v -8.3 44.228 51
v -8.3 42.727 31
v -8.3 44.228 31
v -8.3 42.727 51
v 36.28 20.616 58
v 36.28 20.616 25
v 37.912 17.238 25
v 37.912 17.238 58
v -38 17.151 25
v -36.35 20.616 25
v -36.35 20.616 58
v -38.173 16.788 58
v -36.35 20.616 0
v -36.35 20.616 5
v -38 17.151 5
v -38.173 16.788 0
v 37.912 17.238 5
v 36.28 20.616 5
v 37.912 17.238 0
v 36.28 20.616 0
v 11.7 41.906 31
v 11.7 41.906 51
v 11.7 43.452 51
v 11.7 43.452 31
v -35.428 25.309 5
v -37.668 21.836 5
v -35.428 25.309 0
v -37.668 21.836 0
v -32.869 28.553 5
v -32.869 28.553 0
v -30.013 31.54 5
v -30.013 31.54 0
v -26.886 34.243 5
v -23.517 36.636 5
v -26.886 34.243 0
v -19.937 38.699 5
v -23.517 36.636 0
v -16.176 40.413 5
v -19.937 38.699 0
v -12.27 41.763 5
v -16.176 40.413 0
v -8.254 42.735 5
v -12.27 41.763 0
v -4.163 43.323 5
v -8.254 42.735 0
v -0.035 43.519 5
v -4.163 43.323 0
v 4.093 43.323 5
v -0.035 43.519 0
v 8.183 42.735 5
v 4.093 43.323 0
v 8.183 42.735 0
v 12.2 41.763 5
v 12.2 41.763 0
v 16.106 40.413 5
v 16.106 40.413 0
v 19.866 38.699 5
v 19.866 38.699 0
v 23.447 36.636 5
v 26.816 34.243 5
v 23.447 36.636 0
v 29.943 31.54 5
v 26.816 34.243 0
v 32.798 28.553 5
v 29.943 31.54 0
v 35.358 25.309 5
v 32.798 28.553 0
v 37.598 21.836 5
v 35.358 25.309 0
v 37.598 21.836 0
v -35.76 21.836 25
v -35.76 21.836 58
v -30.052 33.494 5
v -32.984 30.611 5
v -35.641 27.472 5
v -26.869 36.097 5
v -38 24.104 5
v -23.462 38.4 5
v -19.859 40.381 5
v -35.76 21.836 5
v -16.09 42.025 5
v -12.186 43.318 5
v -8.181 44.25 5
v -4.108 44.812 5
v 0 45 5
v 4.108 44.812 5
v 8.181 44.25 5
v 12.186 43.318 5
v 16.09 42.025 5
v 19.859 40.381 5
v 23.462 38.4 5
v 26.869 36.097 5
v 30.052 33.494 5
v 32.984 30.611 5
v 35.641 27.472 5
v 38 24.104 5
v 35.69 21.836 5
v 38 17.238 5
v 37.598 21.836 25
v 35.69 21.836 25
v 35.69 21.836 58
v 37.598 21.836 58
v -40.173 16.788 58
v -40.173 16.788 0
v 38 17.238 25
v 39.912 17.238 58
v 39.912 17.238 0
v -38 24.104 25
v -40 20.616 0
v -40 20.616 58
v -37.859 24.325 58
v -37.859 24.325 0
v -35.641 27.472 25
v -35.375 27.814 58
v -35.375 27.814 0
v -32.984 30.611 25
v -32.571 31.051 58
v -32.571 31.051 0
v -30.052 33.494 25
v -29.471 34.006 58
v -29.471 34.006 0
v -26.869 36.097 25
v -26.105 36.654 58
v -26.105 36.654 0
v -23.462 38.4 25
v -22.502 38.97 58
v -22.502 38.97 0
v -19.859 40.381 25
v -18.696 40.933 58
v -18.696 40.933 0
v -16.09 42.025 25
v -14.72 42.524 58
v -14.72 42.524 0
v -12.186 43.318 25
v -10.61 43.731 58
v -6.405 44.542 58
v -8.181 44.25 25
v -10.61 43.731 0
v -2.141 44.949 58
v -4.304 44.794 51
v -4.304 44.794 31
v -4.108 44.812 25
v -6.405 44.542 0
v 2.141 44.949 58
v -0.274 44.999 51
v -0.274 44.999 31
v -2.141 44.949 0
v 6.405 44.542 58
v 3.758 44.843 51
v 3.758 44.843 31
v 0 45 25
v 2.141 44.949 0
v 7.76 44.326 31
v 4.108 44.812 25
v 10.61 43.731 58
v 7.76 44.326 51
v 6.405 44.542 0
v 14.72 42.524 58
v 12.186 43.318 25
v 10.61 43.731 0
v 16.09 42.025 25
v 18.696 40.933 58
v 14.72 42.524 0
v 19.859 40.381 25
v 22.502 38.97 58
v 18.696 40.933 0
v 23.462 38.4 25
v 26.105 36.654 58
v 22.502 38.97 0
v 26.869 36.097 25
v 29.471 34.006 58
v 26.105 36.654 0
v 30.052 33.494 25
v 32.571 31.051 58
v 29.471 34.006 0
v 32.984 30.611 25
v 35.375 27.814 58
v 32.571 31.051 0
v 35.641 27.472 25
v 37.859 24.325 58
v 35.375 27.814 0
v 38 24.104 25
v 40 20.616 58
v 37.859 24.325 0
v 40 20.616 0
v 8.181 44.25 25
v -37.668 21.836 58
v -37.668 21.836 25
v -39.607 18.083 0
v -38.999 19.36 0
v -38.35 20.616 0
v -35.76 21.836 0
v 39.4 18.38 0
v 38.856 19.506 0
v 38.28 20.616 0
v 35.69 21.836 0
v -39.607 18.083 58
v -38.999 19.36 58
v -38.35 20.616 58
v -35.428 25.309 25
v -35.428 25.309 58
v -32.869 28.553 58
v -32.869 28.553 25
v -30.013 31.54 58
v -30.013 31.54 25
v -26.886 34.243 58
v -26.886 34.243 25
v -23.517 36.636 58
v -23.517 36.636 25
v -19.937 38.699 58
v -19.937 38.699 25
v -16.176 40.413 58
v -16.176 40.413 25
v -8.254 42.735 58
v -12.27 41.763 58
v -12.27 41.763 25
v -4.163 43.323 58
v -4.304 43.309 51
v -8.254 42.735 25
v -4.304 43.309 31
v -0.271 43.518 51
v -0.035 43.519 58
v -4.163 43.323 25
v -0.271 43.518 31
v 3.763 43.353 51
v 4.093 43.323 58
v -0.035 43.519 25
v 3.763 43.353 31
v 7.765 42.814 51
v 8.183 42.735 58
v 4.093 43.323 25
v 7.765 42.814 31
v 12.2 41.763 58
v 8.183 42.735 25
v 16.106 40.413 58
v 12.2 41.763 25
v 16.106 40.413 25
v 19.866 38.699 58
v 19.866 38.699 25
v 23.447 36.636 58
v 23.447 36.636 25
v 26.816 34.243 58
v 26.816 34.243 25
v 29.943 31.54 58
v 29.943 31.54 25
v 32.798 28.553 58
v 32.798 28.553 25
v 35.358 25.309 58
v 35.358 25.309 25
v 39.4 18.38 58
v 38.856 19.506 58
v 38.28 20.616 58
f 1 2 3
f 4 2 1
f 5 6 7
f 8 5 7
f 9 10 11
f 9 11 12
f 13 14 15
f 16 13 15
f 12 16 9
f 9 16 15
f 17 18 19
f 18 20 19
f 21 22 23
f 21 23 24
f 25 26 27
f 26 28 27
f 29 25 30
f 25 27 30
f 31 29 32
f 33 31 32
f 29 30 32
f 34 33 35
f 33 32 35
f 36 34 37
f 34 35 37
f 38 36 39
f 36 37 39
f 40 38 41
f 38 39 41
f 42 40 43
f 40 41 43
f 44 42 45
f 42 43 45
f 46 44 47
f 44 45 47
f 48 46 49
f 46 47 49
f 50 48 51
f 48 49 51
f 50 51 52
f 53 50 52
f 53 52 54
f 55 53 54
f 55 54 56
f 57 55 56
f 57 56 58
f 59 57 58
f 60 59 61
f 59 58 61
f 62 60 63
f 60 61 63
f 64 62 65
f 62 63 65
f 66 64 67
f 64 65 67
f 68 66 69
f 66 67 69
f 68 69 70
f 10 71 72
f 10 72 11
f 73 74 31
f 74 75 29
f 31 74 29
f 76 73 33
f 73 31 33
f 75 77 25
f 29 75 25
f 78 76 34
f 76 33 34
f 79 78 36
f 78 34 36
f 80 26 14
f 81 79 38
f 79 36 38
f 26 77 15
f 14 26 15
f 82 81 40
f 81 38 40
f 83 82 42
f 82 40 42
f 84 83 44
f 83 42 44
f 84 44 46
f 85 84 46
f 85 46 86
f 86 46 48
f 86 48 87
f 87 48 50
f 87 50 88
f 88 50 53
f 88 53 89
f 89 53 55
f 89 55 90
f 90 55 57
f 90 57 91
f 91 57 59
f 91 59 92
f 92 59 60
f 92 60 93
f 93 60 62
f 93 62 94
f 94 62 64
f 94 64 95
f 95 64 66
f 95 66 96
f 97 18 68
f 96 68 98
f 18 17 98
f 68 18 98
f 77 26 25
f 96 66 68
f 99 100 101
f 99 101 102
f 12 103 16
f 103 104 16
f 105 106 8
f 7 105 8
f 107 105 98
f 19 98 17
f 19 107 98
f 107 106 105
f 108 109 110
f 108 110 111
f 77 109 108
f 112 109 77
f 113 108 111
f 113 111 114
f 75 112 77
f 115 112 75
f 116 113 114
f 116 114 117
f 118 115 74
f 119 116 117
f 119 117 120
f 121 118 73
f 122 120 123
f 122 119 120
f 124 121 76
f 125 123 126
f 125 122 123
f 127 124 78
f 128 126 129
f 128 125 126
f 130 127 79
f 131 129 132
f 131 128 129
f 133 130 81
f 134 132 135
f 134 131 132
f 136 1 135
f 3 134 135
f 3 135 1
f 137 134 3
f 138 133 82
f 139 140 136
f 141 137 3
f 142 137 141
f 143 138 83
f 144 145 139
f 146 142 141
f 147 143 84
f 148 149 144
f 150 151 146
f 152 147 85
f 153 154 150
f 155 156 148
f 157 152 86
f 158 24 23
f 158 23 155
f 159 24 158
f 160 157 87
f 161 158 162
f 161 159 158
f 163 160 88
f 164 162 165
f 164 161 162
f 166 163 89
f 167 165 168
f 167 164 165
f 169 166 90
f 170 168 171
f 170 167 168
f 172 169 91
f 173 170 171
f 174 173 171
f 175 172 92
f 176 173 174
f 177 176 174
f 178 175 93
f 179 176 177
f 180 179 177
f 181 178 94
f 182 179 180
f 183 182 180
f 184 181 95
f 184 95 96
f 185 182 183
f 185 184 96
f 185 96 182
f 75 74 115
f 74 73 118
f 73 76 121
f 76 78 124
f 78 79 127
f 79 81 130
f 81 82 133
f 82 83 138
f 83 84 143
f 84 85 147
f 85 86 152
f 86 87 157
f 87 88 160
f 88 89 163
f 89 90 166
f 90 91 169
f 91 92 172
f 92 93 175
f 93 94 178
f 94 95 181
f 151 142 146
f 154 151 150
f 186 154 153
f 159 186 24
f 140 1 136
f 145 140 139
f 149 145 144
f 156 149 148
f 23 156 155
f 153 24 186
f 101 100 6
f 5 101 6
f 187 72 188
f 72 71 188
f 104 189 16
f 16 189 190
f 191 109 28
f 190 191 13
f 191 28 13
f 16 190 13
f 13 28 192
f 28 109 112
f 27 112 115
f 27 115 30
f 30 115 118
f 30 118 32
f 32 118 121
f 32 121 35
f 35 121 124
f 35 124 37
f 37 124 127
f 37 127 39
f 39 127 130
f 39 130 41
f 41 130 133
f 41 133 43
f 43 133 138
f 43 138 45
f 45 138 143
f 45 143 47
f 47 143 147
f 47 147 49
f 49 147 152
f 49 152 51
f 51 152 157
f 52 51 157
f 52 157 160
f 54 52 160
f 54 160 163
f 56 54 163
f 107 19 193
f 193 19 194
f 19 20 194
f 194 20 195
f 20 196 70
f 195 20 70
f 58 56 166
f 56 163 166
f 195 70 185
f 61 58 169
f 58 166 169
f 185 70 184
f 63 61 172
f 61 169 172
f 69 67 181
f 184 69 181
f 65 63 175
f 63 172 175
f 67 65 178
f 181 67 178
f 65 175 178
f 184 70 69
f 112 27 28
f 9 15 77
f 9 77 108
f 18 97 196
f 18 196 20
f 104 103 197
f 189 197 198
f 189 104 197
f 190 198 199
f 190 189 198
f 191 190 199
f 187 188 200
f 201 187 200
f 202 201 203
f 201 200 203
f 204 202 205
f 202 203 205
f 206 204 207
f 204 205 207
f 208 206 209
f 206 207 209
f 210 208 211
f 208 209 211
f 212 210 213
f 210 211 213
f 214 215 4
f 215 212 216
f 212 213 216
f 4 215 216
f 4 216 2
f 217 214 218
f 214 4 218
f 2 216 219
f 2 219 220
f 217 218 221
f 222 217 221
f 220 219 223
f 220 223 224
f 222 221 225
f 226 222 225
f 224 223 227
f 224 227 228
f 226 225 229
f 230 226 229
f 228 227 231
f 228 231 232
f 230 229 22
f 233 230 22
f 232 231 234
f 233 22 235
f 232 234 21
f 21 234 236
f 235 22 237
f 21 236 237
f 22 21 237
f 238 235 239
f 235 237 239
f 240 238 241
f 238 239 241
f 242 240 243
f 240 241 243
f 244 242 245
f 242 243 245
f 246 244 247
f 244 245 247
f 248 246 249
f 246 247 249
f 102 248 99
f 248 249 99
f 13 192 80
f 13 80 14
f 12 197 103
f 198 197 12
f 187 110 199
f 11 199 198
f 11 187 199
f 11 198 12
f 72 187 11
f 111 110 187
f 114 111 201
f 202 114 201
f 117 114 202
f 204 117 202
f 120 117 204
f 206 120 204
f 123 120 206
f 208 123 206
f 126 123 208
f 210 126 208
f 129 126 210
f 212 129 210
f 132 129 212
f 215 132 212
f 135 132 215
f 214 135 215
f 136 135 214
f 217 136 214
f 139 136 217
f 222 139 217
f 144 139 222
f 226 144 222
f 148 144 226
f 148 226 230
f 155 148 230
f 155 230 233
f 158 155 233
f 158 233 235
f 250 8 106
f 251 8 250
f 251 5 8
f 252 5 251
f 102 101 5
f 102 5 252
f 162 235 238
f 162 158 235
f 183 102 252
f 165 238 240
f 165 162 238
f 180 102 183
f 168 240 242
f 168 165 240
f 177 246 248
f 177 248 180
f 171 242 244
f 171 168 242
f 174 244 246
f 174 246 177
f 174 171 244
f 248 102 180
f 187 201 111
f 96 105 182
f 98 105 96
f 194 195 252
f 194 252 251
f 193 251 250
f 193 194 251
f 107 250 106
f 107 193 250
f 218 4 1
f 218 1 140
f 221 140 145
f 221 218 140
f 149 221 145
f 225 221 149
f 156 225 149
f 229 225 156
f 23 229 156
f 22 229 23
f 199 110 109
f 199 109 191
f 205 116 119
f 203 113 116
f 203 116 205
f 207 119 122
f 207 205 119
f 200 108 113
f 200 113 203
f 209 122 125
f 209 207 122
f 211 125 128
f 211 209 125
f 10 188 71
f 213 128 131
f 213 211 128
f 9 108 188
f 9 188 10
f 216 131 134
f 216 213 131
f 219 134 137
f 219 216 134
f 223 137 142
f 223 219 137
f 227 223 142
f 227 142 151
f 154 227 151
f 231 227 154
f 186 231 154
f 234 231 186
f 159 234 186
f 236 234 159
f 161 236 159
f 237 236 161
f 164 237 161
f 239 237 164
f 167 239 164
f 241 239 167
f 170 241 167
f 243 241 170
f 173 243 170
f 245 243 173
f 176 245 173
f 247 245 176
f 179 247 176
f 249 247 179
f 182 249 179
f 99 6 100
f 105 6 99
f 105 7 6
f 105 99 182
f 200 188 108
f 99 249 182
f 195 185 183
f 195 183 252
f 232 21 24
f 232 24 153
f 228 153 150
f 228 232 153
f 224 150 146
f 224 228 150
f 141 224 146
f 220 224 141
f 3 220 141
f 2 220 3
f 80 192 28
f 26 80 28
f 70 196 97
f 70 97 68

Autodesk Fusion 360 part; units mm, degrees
sketch "Sketch1" plane through (0, 0, 0) normal (0, 0, 1) x (1, 0, 0)
  arc A0 (40, 20.6155) -> (-40, 20.6155) centre (0, 0) ccw
  arc A1 (39.9116, 17.2383) -> (-40.1731, 16.7877) centre (-0.0351, 0.0189) ccw
  line L0 (-40, 20.6155) -> (-38.35, 20.6155)
  line L1 (40, 20.6155) -> (38.2797, 20.6155)
  line L2 (-40.1731, 16.7877) -> (-38.1731, 16.7877)
  line L3 (39.9116, 17.2383) -> (37.9116, 17.2383)
  line L4 (-36.35, 20.6155) -> (-38.1731, 16.7877)
  line L5 (36.2797, 20.6155) -> (37.9116, 17.2383)
  arc A2 (37.5794, 17.9258) -> (37.9116, 17.2383) centre (37.9116, 17.6623) ccw
  line L6 (35.69, 21.8359) -> (39.3471, 21.8359)
  line L7 (35.69, 21.8359) -> (36.2797, 20.6155)
  line L8 (-0.0351, 0.0189) -> (-0.0351, 49.45) construction
  line L9 (-35.7603, 21.8359) -> (-36.35, 20.6155)
  line L10 (-35.7603, 21.8359) -> (-39.4174, 21.8359)
  dimension "d2" = 80
  dimension "d4" = 2
  dimension "d5" = 2
  dimension "d6" = 2
  dimension "d7" = 2
extrude "Extrude1" add sketch "Sketch1" along normal blind 58 contours A0 A1 L1 L6 | A0 A1 L6 L10 | A1 L3 L5 L6 L7 | A0 A1 L0 L10 | A1 L2 L4 L9 L10
sketch "Sketch2" plane through (0, 0, 0) normal (0, 1, 0) x (1, 0, 0)
  line L0 (0, 0) -> (0, -5)
  line L1 (0, -5) -> (38, -5)
  line L2 (38, -5) -> (-38, -5)
  line L3 (-38, -5) -> (-38, -25)
  line L4 (-38, -25) -> (38, -25)
  line L5 (38, -25) -> (38, -5)
  line L6 (-8.3, -51) -> (11.7, -51)
  line L7 (11.7, -51) -> (11.7, -31)
  line L8 (11.7, -31) -> (-8.3, -31)
  line L9 (-8.3, -31) -> (-8.3, -51)
  line L10 (-8.3, -51) -> (11.7, -31) construction
  line L11 (11.7, -51) -> (-8.3, -31) construction
  line L12 (0, -57.95) -> (0, -50.95)
  point P0 (1.7, -41)
  dimension "d10" = 5
  dimension "d11" = 38
  dimension "d12" = 76
  dimension "d13" = 20
  dimension "d14" = 20
  dimension "d15" = 20
  dimension "d16" = 7
extrude "Extrude2" cut sketch "Sketch2" along normal blind 80
equation "d11 = ( 76 / 2 ) * 1 mm"
